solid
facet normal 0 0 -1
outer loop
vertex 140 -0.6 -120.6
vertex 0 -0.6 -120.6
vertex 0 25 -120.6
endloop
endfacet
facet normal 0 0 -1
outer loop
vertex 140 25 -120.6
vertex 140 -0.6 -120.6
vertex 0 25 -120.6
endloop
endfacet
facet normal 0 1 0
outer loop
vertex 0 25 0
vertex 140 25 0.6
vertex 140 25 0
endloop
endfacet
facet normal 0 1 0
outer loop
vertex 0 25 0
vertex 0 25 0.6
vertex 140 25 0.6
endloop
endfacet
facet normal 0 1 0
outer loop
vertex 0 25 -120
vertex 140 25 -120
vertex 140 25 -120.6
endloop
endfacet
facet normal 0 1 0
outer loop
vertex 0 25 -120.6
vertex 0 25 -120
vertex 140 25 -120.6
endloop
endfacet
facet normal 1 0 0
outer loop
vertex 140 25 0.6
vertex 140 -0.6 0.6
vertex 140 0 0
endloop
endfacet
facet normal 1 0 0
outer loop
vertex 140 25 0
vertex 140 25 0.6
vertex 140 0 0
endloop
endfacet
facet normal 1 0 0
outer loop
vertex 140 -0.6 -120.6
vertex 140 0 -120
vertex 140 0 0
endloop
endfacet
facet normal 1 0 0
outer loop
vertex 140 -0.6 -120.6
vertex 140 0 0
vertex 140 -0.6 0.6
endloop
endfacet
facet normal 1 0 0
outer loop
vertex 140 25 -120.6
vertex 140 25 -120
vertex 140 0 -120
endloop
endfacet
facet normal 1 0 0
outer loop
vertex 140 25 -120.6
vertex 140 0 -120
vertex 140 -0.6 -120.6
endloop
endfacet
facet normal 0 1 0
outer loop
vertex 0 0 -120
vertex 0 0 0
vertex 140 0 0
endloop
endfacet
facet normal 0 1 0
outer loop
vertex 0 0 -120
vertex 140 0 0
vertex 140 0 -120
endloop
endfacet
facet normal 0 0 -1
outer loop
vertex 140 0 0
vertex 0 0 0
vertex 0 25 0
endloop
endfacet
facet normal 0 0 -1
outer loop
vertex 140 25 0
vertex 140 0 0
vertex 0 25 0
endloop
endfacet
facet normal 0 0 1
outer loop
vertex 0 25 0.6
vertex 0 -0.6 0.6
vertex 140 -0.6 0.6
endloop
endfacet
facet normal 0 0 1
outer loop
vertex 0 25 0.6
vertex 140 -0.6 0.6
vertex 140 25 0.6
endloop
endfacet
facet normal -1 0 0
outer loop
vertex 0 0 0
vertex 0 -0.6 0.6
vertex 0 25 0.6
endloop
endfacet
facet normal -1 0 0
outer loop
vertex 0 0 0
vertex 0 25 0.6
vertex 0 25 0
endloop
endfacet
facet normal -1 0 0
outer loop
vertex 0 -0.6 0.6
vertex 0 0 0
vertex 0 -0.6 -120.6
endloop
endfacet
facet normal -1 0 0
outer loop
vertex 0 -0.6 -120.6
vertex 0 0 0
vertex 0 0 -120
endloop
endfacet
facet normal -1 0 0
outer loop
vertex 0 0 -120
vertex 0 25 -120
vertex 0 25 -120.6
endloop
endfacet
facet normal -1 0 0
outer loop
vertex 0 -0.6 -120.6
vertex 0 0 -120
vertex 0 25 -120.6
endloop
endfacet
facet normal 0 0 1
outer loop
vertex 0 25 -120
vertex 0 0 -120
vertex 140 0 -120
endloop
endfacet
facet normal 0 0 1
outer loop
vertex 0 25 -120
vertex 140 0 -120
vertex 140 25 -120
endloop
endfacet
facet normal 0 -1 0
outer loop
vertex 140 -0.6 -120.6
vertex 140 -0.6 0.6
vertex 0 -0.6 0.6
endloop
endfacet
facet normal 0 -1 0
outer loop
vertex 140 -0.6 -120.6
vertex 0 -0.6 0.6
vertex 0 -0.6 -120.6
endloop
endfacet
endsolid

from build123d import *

# Parameters (mm, degrees)
CROQUIS1_W              = 120
CROQUIS1_H              = 25
SALIENTE_EXTRUIR1_DEPTH = 140
VACIADO1_T              = 0.6


with BuildPart() as part:
    # Croquis1 → Saliente-Extruir1 (new body)
    with BuildSketch(Plane(origin=(0, 0, 0), x_dir=(0, 0, -1), z_dir=(1, 0, 0))):
        with Locations((60, 12.5)):
            Rectangle(CROQUIS1_W, CROQUIS1_H)
    extrude(amount=SALIENTE_EXTRUIR1_DEPTH)

    # Vaciado1
    vaciado1_openings = [part.faces().sort_by_distance(p)[0] for p in [
        (70, 25, -60),
        (0, 12.5, -60),
        (140, 12.5, -60),
    ]]
    offset(amount=VACIADO1_T, openings=vaciado1_openings, kind=Kind.INTERSECTION)


solid = part.part
